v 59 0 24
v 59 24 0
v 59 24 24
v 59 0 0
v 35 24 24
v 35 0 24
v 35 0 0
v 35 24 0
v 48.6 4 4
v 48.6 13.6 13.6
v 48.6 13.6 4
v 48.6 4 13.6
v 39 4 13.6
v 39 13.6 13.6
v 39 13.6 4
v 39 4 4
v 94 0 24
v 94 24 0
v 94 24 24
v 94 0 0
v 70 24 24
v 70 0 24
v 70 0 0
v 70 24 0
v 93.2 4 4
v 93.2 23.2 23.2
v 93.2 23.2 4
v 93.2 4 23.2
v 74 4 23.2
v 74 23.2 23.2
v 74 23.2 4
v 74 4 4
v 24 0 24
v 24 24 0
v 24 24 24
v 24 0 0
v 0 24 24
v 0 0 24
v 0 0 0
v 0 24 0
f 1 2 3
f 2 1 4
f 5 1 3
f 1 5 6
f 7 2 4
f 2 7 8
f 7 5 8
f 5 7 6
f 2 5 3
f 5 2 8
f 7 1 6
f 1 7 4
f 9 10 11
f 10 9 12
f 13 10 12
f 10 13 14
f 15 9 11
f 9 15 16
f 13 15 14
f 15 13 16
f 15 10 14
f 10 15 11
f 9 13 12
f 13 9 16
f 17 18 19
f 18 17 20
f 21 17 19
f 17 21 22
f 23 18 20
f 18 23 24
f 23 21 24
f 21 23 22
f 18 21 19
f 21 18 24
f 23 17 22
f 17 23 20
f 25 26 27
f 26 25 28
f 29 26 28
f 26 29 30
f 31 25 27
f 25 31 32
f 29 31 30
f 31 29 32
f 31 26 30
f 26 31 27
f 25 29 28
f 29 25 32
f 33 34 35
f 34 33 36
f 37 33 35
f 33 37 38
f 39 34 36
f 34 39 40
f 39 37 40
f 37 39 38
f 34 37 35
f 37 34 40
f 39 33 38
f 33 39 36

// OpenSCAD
/*
Title: Buoyancy Comparison Block Set
Folder: 15_fluids_pressure
Physics Topic: Density and buoyancy
Difficulty: Beginner-Intermediate
Print Type: FDM, single material
Teaches: Conceptual mechanics
Use Case: Classroom manipulative
*/


// --------------------
// Parameters
// --------------------
block_size = 24;
void_ratio = [0.0,0.2,0.4];

module buoyancy_block(v=0.2){
    difference(){
        cube([block_size,block_size,block_size]);
        if(v>0) translate([4,4,4]) cube([block_size*v*2,block_size*v*2,block_size*v*2]);
    }
}
for(i=[0:len(void_ratio)-1]) translate([i*35,0,0]) buoyancy_block(void_ratio[i]);
